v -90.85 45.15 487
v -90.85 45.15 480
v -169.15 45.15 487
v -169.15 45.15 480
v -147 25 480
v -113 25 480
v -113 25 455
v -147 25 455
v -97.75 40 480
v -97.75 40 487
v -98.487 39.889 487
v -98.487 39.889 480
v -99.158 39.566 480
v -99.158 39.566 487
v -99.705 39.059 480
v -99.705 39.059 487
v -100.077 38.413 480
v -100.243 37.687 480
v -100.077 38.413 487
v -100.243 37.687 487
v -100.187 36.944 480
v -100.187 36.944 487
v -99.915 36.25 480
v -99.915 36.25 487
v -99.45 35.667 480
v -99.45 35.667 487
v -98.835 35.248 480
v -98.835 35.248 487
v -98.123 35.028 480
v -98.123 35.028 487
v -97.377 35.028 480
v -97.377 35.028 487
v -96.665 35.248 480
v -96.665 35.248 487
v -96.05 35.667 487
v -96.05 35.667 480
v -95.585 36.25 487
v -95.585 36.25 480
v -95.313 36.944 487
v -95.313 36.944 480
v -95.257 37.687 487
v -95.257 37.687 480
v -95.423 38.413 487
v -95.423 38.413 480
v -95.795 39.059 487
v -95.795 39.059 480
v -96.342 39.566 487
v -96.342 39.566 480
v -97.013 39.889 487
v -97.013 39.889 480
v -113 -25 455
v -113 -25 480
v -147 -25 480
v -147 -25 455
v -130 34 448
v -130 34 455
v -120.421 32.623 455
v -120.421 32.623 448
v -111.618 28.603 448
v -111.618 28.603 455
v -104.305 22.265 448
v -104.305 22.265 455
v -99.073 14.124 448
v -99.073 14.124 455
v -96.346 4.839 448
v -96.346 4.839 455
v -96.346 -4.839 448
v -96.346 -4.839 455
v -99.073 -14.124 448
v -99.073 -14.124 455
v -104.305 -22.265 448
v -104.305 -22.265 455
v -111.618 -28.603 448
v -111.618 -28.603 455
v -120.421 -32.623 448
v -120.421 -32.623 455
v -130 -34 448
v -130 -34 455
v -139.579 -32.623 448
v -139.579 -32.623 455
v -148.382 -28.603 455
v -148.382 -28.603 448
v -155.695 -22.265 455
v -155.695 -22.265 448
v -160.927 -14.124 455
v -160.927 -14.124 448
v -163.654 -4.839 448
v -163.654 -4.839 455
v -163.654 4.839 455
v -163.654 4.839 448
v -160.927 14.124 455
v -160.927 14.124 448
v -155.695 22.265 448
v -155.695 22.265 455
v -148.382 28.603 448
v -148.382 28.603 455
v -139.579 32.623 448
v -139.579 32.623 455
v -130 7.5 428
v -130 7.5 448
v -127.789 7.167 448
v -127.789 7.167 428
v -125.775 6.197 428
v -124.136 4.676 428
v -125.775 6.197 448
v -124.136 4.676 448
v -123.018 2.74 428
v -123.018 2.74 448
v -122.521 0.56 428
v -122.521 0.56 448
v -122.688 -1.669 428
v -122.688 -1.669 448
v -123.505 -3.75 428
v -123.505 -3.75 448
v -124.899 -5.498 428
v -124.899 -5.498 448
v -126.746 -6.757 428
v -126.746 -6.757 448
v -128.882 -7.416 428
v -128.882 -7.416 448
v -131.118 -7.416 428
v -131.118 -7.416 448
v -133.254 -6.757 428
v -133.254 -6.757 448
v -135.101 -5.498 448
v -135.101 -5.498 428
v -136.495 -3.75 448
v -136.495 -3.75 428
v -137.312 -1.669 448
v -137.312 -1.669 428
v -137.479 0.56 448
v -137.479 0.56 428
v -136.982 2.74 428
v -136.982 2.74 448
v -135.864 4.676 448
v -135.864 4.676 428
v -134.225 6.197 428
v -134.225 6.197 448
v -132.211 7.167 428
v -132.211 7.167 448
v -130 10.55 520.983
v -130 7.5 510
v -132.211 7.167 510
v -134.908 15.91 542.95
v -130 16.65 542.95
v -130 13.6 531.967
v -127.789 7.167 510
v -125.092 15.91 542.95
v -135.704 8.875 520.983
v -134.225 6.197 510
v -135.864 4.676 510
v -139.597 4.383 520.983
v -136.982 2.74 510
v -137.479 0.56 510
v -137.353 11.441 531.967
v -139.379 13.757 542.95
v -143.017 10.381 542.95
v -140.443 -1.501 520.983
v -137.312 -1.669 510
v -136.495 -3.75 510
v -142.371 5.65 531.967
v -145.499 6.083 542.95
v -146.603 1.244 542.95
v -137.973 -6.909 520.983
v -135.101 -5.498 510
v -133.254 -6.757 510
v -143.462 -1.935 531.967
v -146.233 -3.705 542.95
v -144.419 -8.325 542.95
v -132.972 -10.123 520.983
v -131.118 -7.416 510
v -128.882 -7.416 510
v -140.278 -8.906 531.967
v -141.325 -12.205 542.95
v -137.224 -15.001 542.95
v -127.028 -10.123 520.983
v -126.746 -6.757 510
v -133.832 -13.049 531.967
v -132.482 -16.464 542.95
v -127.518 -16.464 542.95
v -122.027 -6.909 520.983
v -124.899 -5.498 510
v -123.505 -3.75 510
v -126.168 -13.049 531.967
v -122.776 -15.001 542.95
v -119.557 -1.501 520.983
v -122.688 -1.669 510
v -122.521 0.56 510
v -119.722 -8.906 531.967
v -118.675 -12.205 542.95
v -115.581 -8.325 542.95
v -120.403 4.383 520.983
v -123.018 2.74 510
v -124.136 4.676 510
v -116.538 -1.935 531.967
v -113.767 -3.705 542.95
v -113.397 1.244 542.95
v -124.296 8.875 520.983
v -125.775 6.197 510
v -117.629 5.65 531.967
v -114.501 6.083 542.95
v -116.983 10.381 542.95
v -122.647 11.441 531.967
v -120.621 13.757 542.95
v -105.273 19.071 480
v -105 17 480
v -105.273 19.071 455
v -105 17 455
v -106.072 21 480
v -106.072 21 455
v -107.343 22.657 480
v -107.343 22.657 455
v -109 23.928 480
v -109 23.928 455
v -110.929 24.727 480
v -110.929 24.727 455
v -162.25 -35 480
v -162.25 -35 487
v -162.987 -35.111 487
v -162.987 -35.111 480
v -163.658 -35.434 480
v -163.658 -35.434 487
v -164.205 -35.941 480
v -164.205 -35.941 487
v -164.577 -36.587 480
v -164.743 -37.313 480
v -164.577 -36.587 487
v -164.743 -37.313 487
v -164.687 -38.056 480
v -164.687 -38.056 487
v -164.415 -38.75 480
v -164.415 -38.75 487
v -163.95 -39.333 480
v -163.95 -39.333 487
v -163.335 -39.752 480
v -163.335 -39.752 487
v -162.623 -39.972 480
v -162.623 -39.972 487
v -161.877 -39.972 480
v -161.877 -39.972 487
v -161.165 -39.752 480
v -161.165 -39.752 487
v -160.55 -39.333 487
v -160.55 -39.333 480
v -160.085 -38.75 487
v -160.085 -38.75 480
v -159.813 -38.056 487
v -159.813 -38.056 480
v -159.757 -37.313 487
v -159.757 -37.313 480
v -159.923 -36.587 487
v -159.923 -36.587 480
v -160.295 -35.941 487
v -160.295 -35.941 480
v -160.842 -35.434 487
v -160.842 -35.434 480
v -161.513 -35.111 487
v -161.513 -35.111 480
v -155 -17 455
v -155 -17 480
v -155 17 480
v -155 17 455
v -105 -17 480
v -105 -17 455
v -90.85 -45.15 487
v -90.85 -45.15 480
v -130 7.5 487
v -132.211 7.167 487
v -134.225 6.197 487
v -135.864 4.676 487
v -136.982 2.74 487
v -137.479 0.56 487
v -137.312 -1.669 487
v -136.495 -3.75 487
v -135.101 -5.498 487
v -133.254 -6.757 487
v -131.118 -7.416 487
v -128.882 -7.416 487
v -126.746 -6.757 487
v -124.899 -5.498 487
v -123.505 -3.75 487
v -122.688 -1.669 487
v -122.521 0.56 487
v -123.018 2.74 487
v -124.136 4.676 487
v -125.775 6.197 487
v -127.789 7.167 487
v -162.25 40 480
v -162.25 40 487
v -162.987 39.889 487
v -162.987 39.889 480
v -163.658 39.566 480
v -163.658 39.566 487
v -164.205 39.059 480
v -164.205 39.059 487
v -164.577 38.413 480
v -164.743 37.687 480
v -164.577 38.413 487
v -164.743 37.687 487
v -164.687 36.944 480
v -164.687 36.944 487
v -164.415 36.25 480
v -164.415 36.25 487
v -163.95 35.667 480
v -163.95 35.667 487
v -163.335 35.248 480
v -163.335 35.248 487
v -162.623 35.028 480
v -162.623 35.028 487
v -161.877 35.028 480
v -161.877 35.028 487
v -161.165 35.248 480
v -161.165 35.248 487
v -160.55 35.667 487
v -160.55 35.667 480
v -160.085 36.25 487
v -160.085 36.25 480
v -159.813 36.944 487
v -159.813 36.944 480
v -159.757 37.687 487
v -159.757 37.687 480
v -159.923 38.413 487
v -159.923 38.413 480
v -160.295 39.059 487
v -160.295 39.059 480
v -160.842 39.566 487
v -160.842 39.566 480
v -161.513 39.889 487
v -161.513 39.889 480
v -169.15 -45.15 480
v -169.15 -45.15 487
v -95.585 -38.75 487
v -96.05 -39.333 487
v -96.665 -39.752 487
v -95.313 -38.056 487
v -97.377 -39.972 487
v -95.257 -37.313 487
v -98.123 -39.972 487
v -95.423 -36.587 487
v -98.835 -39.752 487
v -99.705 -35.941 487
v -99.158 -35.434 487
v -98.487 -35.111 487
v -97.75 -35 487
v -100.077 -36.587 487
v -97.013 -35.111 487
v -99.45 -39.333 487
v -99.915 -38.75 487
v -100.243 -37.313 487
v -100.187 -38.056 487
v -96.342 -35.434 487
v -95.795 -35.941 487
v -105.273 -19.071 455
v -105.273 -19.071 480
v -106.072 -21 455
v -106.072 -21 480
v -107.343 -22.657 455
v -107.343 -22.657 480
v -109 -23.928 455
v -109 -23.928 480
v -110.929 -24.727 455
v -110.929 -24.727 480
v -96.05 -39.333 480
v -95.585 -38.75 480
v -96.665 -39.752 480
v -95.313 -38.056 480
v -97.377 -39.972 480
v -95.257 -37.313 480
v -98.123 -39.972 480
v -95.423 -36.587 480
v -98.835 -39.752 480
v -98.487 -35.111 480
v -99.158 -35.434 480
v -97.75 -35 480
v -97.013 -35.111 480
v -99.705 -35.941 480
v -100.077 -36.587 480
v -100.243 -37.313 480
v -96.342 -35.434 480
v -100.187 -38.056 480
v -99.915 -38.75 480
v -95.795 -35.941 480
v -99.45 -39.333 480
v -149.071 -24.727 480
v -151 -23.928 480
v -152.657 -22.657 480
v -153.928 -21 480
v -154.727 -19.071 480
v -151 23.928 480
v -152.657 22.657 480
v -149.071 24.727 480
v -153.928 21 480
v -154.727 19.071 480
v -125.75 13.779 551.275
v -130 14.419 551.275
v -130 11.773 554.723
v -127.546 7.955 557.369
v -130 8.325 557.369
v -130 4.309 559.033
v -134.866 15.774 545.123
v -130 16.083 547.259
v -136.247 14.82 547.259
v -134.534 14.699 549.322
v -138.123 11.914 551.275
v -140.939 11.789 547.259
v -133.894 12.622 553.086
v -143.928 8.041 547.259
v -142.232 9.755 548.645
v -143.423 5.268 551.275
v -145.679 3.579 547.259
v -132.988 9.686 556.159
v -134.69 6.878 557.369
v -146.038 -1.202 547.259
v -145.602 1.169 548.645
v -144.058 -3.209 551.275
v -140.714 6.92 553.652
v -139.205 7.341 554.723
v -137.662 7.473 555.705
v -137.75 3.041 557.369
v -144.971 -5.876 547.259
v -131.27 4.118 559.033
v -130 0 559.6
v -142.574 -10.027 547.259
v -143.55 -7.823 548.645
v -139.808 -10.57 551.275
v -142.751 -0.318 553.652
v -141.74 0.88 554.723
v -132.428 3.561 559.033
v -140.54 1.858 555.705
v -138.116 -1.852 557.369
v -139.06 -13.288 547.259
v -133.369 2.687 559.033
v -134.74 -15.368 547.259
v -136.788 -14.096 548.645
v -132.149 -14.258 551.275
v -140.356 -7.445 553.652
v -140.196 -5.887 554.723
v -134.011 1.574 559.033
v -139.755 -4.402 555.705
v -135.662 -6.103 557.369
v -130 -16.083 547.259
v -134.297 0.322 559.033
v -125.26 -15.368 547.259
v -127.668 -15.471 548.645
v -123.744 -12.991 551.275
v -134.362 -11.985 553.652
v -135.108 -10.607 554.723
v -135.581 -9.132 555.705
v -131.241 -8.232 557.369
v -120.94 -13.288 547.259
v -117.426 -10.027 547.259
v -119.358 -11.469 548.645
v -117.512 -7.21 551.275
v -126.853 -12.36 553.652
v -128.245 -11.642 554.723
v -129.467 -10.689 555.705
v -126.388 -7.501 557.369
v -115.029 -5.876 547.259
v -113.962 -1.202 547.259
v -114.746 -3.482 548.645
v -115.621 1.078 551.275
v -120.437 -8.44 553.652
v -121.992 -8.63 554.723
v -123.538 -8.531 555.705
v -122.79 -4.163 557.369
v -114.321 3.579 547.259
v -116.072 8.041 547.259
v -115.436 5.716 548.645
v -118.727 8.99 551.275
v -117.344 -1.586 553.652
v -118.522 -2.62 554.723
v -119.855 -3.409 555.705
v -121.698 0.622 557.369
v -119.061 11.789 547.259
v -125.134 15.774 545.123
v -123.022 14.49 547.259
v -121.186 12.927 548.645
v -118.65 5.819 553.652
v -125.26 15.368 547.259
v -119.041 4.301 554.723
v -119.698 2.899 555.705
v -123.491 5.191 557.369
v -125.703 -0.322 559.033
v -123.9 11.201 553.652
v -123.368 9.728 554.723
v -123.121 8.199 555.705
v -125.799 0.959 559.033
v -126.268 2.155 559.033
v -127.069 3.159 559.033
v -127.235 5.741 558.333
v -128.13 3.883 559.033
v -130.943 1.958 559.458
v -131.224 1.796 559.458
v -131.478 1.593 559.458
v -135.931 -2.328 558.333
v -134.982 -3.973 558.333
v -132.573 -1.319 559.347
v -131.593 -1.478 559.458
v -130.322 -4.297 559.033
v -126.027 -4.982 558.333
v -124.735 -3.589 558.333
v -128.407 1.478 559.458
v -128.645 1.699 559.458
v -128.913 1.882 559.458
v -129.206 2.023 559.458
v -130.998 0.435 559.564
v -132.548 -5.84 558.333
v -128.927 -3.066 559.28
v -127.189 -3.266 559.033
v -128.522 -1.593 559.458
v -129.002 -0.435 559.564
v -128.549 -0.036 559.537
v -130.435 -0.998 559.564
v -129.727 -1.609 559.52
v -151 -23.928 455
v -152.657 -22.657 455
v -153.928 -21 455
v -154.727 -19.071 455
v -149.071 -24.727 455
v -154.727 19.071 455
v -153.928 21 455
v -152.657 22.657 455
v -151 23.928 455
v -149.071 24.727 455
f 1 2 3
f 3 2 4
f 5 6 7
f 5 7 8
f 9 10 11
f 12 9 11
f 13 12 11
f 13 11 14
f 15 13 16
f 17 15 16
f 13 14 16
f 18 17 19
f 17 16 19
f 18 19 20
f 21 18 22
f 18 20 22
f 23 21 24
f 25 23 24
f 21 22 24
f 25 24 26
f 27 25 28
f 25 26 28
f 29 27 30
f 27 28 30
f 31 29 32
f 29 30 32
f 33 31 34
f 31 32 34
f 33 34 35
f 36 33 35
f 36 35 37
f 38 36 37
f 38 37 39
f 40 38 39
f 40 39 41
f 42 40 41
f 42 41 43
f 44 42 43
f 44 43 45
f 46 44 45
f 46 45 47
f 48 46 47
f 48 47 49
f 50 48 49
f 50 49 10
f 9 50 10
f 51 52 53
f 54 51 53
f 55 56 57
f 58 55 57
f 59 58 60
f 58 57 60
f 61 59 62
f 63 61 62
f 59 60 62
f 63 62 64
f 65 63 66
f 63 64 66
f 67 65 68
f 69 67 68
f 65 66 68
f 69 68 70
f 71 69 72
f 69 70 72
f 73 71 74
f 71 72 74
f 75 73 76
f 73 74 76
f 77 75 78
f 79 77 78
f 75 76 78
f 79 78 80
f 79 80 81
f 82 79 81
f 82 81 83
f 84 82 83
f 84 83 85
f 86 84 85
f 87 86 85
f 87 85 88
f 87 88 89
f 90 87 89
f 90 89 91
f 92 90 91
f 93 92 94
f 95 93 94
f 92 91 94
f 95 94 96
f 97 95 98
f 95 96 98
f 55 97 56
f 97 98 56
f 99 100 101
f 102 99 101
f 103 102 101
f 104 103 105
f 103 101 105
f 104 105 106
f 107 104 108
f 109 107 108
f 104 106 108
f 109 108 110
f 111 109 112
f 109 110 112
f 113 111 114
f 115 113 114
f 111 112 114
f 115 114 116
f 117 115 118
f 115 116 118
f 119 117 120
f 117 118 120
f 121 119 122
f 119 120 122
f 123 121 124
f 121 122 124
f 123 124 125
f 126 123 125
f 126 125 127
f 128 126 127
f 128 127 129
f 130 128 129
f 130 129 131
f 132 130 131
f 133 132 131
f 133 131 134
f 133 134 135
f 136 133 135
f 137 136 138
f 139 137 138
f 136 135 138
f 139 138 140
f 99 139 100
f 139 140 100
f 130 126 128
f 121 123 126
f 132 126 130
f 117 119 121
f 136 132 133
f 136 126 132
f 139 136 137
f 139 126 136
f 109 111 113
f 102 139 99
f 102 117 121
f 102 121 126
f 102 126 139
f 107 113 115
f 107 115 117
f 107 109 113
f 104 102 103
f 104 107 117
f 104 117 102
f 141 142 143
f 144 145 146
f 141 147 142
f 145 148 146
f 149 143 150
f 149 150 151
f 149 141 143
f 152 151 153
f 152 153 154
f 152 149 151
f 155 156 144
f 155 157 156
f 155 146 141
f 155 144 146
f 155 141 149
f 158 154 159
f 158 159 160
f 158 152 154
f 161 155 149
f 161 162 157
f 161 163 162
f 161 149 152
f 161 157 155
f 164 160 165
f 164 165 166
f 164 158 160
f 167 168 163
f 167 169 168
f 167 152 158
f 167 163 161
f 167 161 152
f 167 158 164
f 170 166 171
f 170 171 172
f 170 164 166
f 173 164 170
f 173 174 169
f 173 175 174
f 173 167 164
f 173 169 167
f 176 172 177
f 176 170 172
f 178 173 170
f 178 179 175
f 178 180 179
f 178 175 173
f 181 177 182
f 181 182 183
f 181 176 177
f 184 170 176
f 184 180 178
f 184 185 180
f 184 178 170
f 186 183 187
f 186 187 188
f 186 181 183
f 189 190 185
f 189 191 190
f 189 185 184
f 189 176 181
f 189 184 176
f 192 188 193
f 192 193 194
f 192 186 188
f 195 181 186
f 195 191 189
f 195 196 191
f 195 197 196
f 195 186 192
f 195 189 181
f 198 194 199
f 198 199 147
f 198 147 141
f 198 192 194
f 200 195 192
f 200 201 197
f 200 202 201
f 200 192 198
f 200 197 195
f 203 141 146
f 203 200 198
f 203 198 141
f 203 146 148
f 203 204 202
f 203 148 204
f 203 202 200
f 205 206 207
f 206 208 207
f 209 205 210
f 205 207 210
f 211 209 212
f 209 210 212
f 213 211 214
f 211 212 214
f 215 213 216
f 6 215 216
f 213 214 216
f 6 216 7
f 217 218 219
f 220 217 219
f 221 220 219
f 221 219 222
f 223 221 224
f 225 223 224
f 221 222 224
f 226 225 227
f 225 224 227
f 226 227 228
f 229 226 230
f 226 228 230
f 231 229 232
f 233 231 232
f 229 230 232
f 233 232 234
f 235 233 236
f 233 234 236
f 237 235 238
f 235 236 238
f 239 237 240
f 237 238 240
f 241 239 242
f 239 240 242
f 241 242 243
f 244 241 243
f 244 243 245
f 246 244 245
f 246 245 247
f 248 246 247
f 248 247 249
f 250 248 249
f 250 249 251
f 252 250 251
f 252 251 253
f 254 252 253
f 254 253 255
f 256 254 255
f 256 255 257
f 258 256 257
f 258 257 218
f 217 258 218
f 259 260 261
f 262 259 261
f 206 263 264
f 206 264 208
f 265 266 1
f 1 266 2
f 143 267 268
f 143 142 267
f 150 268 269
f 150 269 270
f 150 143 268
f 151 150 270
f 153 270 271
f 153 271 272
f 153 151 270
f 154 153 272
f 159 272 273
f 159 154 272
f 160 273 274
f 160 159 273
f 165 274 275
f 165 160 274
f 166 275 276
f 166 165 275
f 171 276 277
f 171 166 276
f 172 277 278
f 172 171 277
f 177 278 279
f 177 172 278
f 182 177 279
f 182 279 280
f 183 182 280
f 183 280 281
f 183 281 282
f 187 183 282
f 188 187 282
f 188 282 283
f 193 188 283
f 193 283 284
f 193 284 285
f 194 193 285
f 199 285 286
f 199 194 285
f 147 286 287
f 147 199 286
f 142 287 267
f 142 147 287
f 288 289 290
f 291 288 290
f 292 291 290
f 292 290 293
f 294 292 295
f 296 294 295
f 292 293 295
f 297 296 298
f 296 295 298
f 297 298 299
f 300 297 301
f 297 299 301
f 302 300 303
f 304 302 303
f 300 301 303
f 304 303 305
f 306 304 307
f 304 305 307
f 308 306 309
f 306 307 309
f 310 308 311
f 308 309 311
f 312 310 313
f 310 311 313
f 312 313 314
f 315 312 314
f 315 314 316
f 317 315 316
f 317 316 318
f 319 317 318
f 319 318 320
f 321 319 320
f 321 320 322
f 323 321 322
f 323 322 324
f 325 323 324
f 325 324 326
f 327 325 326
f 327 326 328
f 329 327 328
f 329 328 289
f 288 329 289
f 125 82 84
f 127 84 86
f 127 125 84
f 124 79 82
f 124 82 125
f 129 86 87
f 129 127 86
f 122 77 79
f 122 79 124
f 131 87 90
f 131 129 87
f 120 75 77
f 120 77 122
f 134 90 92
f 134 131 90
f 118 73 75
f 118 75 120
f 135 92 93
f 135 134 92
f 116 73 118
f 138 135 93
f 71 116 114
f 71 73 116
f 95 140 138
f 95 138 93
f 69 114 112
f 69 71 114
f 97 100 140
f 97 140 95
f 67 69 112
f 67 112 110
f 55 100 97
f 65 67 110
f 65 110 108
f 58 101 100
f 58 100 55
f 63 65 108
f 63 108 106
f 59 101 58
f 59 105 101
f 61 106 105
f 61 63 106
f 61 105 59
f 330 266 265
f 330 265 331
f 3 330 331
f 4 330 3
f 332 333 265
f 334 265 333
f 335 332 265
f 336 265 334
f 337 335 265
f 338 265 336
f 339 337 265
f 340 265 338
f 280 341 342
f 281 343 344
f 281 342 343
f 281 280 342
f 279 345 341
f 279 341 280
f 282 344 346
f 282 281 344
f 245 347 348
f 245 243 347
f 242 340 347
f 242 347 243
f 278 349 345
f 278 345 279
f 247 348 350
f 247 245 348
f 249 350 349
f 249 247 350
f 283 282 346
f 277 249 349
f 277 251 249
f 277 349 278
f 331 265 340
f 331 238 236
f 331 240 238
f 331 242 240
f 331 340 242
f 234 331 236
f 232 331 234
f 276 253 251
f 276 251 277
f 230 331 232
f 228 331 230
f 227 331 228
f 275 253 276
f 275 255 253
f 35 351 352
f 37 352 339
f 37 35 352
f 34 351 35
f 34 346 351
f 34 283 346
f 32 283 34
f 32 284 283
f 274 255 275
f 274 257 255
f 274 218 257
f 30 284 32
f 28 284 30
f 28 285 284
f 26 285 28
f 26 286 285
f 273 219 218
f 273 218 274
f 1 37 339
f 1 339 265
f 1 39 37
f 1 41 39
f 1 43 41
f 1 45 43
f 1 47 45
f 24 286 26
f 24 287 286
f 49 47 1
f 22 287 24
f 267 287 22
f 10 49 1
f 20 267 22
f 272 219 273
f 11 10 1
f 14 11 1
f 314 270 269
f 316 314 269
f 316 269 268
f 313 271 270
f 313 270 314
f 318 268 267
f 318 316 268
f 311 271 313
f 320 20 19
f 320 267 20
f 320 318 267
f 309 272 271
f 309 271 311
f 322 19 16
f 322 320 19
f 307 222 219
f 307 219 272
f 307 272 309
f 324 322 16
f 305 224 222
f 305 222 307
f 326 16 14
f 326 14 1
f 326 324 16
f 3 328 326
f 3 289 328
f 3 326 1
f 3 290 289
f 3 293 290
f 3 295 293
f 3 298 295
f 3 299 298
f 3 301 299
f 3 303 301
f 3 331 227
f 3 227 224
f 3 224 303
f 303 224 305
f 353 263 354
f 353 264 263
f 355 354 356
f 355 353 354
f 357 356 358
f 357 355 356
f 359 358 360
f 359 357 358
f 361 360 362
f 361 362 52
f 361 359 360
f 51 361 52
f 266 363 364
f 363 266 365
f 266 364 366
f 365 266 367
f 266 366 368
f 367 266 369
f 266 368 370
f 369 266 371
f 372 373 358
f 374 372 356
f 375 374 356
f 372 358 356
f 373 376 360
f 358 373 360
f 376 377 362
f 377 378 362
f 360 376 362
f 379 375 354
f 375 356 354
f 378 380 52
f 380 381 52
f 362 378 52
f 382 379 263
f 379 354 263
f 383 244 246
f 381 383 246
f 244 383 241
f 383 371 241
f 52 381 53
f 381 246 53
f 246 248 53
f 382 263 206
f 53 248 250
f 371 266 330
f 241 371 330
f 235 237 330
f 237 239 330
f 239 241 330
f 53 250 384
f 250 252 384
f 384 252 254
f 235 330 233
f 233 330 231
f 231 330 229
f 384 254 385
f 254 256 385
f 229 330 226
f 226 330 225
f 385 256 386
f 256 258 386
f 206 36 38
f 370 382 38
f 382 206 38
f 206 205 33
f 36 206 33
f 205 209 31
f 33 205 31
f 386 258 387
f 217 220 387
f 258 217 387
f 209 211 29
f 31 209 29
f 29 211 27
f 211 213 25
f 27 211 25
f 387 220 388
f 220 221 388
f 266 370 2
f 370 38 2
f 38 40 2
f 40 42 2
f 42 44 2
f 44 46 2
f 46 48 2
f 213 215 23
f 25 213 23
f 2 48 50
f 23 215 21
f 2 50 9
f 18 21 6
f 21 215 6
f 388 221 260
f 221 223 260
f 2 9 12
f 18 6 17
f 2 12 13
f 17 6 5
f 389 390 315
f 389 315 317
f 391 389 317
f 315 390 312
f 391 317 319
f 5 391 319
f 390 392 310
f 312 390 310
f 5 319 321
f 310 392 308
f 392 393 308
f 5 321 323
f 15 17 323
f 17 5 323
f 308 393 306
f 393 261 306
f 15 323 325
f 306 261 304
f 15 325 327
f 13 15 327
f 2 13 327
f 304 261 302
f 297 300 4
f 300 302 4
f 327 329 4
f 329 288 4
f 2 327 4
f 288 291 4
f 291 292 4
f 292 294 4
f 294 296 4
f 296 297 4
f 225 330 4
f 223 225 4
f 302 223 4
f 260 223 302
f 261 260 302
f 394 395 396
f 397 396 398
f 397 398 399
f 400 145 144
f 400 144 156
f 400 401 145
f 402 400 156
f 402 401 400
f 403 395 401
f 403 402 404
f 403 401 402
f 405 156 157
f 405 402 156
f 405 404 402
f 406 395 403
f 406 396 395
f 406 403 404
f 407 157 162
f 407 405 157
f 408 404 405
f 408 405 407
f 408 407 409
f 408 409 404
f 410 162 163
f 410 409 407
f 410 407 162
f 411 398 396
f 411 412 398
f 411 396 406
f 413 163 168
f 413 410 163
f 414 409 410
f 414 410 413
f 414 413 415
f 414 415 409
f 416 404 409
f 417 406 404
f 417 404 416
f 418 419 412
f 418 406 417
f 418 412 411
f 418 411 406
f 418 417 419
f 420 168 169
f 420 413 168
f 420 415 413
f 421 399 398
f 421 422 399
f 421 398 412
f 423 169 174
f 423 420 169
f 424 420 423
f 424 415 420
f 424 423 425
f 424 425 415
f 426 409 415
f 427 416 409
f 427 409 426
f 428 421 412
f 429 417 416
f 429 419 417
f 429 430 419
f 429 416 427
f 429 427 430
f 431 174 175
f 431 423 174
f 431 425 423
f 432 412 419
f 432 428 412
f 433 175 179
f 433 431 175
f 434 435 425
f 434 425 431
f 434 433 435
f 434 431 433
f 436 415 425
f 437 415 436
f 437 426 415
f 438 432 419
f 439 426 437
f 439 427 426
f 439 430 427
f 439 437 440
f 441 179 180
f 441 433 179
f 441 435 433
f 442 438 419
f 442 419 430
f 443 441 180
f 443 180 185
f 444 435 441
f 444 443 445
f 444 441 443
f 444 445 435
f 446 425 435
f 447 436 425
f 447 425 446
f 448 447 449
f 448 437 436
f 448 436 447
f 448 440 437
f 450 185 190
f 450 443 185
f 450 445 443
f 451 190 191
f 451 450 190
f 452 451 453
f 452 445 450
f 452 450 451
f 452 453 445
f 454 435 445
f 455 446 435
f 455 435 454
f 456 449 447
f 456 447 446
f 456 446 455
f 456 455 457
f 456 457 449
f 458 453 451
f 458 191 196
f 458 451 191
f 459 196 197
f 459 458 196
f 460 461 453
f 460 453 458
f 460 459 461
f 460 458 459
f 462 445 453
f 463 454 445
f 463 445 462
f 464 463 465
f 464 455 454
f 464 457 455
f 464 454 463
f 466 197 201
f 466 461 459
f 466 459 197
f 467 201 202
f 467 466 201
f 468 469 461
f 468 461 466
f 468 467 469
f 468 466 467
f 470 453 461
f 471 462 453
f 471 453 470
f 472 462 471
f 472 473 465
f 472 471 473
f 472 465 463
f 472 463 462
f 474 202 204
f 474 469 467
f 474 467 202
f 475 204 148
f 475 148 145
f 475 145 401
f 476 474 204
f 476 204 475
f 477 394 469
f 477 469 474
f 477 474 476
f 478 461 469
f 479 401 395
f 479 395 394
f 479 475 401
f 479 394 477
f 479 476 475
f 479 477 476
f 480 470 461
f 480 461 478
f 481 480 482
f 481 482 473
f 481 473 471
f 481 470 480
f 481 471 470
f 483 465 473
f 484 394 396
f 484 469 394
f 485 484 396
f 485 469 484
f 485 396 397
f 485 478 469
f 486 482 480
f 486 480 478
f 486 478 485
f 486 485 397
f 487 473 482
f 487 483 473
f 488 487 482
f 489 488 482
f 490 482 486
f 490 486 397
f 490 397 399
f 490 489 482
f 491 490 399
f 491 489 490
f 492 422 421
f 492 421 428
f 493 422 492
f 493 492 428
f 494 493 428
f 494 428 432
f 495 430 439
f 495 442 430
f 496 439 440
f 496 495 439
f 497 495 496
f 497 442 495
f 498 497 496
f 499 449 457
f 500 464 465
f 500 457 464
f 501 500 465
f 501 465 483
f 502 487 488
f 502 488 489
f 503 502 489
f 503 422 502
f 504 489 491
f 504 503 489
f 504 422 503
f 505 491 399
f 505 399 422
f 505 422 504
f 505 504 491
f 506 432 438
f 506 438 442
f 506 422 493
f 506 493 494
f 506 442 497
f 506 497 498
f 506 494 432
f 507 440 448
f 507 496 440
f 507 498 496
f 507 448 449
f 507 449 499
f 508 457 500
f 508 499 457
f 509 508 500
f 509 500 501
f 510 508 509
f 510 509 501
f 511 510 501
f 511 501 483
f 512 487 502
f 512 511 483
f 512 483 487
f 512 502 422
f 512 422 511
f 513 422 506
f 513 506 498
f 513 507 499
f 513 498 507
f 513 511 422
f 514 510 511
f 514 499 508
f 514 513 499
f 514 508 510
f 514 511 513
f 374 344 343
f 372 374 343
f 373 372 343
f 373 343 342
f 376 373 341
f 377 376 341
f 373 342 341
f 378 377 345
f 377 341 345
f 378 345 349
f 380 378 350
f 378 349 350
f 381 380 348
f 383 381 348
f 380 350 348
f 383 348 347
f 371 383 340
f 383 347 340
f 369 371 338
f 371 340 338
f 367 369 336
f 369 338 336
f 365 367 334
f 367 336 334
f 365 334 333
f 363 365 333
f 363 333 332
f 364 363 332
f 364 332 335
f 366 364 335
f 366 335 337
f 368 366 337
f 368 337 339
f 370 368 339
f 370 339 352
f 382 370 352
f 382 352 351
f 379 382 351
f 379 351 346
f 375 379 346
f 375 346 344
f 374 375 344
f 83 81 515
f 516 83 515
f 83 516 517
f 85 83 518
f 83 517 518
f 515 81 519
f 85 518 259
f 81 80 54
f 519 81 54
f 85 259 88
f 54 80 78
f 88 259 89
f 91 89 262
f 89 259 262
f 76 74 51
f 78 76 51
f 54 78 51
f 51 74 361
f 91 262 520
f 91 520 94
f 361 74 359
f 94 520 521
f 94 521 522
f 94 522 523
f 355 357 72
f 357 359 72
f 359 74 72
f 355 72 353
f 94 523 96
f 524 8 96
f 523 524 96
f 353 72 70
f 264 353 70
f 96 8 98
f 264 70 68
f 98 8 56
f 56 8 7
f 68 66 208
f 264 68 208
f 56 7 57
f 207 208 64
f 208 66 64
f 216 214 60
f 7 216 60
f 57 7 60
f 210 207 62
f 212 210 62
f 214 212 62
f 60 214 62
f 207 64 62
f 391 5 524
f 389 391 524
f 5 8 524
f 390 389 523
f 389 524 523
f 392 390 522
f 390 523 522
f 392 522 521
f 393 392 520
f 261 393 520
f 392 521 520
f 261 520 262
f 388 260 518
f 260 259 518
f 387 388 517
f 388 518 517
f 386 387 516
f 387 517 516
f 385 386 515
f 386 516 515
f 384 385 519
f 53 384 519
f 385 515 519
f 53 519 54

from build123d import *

# Parameters (mm, degrees)
SKETCH005_W             = 90.3
SKETCH005_H             = 78.3
PAD003_DEPTH            = 7
SKETCH006_R             = 2.5
POCKET002_DEPTH         = 7.001
SKETCH008_W             = 50
SKETCH008_H             = 50
PAD004_DEPTH            = 25
FILLET_R                = 8
SKETCH009_R             = 34
PAD005_DEPTH            = 7
SKETCH010_R             = 7.5
PAD006_DEPTH            = 20
BODY002_PLACEMENT_ANGLE = 90


with BuildPart() as part:
    # Sketch005 → Pad003 (new body)
    with BuildSketch(Plane.XY):
        Rectangle(SKETCH005_W, SKETCH005_H)
    extrude(amount=PAD003_DEPTH)

    # Sketch006 (on Face6 of Pad003) → Pocket002 (cut, through all)
    with BuildSketch(Plane.XY.offset(7)):
        with Locations((-37.5, 32.25)):
            Circle(SKETCH006_R)
        with Locations((-37.5, -32.25)):
            Circle(SKETCH006_R)
        with Locations((37.5, -32.25)):
            Circle(SKETCH006_R)
        with Locations((37.5, 32.25)):
            Circle(SKETCH006_R)
    extrude(amount=-POCKET002_DEPTH, mode=Mode.SUBTRACT)

    # Sketch007 → Revolution (revolve)
    with BuildSketch(Plane.XZ):
        with BuildLine():
            Line((7.5, 0), (7.5, 30))
            Line((7.5, 30), (16.65, 62.95))
            ThreePointArc((16.65, 62.95), (11.773328, 74.723328), (0, 79.6))
            Line((0, 0), (0, 79.6))
            Line((7.5, 0), (0, 0))
        make_face()
    revolve(axis=Axis((0, 0, 0), (0, 0, 1)))

    # Sketch008 → Pad004 (join)
    with BuildSketch(Plane.XY):
        Rectangle(SKETCH008_W, SKETCH008_H)
    extrude(amount=-PAD004_DEPTH)

    # Fillet
    fillet_edges = [part.edges().sort_by_distance(p)[0] for p in [
        (25, -25, -12.5),
        (-25, 25, -12.5),
        (-25, -25, -12.5),
        (25, 25, -12.5),
    ]]
    fillet(fillet_edges, radius=FILLET_R)

    # Sketch009 (on Face15 of Pad004) → Pad005 (join)
    with BuildSketch(Plane(origin=(0, 0, -25), x_dir=(1, 0, 0), z_dir=(0, 0, -1))):
        Circle(SKETCH009_R)
    extrude(amount=PAD005_DEPTH)

    # Sketch010 (on Face22 of Pad005) → Pad006 (join)
    with BuildSketch(Plane(origin=(0, 0, -32), x_dir=(1, 0, 0), z_dir=(0, 0, -1))):
        Circle(SKETCH010_R)
    extrude(amount=PAD006_DEPTH)


with BuildPart() as part_1:
    # Body002 placement: moved
    add(part.part.moved(Location((-130, 0, 480))).rotate(Axis((-130, 0, 480), (0, 0, 1)), BODY002_PLACEMENT_ANGLE))


solid = part_1.part
